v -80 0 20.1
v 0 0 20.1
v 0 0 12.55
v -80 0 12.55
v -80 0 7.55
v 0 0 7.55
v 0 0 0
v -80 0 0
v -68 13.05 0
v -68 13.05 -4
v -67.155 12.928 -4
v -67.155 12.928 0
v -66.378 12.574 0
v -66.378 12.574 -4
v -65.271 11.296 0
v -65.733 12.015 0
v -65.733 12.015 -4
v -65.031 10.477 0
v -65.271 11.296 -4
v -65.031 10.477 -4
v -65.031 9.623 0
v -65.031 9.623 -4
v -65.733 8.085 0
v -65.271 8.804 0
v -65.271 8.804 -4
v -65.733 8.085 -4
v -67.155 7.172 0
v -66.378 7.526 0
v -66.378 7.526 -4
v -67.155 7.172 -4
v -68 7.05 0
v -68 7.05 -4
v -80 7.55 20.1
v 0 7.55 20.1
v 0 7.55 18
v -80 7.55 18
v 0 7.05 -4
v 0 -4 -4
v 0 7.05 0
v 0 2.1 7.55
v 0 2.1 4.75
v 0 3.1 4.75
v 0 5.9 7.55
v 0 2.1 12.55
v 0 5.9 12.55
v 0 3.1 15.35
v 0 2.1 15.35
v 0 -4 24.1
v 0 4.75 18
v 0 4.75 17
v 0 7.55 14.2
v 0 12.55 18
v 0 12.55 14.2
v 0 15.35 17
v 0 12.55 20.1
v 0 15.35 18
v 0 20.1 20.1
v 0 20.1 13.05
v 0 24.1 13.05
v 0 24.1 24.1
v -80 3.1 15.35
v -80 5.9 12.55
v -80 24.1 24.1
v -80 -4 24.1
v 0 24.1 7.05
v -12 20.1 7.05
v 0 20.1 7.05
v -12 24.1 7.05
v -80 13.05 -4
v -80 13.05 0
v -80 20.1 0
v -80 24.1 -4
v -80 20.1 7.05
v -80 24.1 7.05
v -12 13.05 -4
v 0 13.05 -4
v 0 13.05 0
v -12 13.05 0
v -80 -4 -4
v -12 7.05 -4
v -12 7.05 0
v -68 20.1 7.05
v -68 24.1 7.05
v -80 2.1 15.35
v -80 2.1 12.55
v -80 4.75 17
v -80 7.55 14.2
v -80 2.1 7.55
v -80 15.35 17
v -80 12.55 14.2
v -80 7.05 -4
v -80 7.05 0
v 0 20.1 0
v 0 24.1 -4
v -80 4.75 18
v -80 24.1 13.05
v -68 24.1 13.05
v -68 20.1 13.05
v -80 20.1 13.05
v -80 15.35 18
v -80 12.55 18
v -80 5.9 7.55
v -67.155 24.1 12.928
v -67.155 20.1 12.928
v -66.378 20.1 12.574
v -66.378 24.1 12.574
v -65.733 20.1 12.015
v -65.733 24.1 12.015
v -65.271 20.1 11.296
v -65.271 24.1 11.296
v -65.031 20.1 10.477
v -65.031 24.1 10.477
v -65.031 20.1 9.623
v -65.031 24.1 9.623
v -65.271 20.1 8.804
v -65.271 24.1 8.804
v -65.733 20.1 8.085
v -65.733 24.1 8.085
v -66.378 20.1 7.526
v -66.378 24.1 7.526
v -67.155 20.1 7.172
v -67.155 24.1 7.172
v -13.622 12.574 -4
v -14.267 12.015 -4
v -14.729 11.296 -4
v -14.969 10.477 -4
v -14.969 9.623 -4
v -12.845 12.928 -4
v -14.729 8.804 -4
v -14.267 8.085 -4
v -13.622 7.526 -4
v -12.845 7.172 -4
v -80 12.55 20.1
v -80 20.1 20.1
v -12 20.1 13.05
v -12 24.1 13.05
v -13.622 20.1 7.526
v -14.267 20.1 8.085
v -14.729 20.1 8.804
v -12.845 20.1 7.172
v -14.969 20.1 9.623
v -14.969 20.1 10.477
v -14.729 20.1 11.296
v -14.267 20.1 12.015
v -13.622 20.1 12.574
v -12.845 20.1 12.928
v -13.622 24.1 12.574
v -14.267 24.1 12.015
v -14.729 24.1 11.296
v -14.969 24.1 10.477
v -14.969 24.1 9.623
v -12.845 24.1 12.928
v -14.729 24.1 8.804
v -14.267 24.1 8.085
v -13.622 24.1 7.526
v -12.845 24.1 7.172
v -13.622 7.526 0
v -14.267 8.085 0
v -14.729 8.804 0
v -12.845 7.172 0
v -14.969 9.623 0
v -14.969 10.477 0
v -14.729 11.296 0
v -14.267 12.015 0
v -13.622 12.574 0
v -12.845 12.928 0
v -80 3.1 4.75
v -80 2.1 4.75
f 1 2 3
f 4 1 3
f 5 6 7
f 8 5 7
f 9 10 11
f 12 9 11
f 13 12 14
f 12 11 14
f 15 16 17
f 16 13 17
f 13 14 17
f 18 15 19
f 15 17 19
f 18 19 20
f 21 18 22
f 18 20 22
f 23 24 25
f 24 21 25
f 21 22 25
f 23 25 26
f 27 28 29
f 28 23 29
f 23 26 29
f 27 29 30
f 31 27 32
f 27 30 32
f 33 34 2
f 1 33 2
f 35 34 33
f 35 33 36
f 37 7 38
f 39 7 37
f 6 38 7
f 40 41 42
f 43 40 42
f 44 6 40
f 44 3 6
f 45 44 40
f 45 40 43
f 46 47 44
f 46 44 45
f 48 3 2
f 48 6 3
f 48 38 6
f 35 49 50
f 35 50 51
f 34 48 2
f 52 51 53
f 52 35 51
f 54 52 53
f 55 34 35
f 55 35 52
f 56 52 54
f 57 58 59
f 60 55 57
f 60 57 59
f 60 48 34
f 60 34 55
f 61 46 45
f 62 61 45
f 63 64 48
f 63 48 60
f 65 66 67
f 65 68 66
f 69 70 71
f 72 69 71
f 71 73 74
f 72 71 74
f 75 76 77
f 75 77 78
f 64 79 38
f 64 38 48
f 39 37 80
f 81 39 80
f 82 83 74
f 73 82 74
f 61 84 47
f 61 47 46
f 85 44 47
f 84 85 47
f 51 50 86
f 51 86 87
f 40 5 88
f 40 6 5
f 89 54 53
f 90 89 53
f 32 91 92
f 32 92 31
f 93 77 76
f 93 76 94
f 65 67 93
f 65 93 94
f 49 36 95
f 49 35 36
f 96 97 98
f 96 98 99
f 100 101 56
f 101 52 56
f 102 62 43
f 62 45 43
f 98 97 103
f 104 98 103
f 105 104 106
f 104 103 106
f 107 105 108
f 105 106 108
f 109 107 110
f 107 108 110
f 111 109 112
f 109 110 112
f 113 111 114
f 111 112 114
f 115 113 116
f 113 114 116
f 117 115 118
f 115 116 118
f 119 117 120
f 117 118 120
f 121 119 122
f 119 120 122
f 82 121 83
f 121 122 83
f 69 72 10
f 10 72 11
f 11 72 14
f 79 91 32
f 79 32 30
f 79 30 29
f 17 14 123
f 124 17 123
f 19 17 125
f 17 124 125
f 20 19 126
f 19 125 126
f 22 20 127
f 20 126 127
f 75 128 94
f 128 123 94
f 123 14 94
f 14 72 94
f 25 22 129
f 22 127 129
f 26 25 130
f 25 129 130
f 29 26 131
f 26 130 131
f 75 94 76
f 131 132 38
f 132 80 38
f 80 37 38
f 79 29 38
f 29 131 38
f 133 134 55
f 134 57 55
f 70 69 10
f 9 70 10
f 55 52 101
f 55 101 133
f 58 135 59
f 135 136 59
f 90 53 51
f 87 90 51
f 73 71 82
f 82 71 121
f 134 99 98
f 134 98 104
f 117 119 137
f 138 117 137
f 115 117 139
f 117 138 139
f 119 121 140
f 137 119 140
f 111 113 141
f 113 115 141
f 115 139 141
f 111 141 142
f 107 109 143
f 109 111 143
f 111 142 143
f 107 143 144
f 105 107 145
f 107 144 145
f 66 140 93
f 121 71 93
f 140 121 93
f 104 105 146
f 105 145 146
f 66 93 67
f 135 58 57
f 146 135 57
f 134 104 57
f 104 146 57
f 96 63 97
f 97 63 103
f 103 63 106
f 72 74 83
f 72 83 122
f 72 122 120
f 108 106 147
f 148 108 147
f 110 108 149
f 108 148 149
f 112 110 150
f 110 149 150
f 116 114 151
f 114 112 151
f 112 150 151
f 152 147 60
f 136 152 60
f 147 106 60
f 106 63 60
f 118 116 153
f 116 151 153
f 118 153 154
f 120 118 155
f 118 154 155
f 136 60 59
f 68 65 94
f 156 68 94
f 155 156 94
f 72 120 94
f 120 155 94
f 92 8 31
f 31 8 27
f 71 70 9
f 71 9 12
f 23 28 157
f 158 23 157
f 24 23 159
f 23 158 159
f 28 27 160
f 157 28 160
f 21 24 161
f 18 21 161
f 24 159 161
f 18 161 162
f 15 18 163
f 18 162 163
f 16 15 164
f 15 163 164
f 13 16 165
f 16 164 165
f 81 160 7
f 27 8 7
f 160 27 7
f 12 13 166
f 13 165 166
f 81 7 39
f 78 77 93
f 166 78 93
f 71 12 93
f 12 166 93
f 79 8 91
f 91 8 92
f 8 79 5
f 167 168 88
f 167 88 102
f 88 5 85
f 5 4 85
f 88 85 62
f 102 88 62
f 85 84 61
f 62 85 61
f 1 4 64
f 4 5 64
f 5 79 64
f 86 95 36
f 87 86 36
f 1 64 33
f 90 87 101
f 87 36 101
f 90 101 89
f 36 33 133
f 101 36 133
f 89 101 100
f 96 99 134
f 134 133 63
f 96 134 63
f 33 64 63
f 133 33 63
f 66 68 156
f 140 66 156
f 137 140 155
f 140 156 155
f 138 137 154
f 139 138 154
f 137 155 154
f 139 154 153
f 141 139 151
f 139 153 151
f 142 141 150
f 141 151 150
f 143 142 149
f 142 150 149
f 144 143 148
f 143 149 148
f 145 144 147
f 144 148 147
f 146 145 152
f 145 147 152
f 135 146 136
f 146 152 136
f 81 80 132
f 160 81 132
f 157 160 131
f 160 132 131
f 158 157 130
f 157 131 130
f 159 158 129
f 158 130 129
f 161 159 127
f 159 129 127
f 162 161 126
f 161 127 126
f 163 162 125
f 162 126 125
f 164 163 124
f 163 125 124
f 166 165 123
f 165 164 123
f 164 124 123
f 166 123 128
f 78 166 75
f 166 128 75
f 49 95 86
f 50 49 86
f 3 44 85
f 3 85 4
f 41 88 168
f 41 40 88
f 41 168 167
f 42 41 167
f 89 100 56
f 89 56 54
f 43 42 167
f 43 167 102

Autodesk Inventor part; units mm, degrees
ref_plane "YZ Plane" through (0, 0, 0) normal (1, 0, 0) x (0, 1, 0)
ref_plane "XZ Plane" through (0, 0, 0) normal (0, 1, 0) x (-1, 0, 0)
ref_plane "XY Plane" through (0, 0, 0) normal (0, 0, 1) x (1, 0, 0)
sketch "Sketch1" plane through (0, 0, 0) normal (1, 0, 0) x (0, 1, 0)
  line L0 (0, 0) -> (20.1, 0)
  line L1 (20.1, 0) -> (20.1, 20.1)
  line L2 (20.1, 20.1) -> (0, 20.1)
  line L3 (0, 20.1) -> (0, 0)
  line L4 (-4, 24.1) -> (24.1, 24.1)
  line L5 (24.1, 24.1) -> (24.1, -4)
  line L6 (24.1, -4) -> (-4, -4)
  line L7 (-4, -4) -> (-4, 24.1)
  line L8 (12.55, 22.2) -> (7.55, 22.2)
  line L9 (7.55, 22.2) -> (7.55, 18)
  line L10 (7.55, 18) -> (12.55, 18)
  line L11 (12.55, 18) -> (12.55, 22.2)
  line L12 (12.55, 22.2) -> (7.55, 18) construction
  line L13 (7.55, 22.2) -> (12.55, 18) construction
  line L14 (12.55, 18) -> (15.35, 18)
  line L15 (15.35, 18) -> (15.35, 17)
  line L16 (15.35, 17) -> (12.55, 14.2)
  line L17 (12.55, 14.2) -> (7.55, 14.2)
  line L18 (7.55, 18) -> (4.75, 18)
  line L19 (4.75, 18) -> (4.75, 17)
  line L20 (4.75, 17) -> (7.55, 14.2)
  line L21 (2.1, 15.35) -> (3.1, 15.35)
  line L22 (3.1, 4.75) -> (5.9, 7.55)
  line L23 (2.1, 4.75) -> (3.1, 4.75)
  line L24 (-2.1, 12.55) -> (-2.1, 7.55)
  line L25 (2.1, 12.55) -> (-2.1, 12.55)
  line L26 (-2.1, 12.55) -> (2.1, 7.55) construction
  line L27 (-2.1, 7.55) -> (2.1, 12.55) construction
  line L28 (2.1, 7.55) -> (2.1, 4.75)
  line L29 (-2.1, 7.55) -> (2.1, 7.55)
  line L30 (2.1, 7.55) -> (2.1, 12.55)
  line L31 (5.9, 12.55) -> (5.9, 7.55)
  line L32 (2.1, 12.55) -> (2.1, 15.35)
  line L33 (3.1, 15.35) -> (5.9, 12.55)
  point P0 (10.05, 20.1)
  point P1 (0, 10.05)
  point P2 (10.05, 20.1)
  point P3 (0, 10.05)
  point P4 (0, 7.55)
  point P5 (0, 12.55)
  point P6 (7.55, 20.1)
  point P7 (12.55, 20.1)
  dimension "d0" = 20.1
  dimension "d1" = 20.1
  dimension "d2" = 4
  dimension "d3" = 5
  dimension "d4" = 4.2
  dimension "d5" = 2.8
  dimension "d6" = 1
  dimension "d7" = 3.8
  dimension "d8" = 2.8
  dimension "d9" = 5
  dimension "d10" = 1
  dimension "d11" = 135
  dimension "d12" = 5
  dimension "d13" = 4.2
  dimension "d14" = 2.8
  dimension "d15" = 1
  dimension "d16" = 3.8
  dimension "d17" = 2.8
  dimension "d18" = 5
  dimension "d19" = 1
  dimension "d20" = 135
  dimension "d21" = 7.55
  dimension "d22" = 2.1
  dimension "d23" = 90
  dimension "d24" = 7.55
  dimension "d25" = 2.1
  dimension "d26" = 90
extrude "Extrusion1" add sketch "Sketch1" against normal blind 80 contours L29 L24 L25 L3 | L3 L25 L30 L29 | L30 L32 L21 L33 L31 L22 L23 L28 | L11 L10 L9 L2 | L2 L9 L8 L11 | L14 L15 L16 L17 L20 L19 L18 L10 | L4 L5 L6 L7
sketch "Sketch2" plane through (0, -4, -4) normal (0, -1, 0) x (1, 0, 0)
  line L0 (0, 28.1) -> (0, 0) projected
  line L1 (0, 28.1) -> (-80, 28.1) projected
  line L2 (-80, 0) -> (-80, 28.1) projected
  line L3 (0, 0) -> (-80, 0) projected
  line L4 (-80, 0) -> (0, 28.1) construction
  line L5 (-80, 28.1) -> (0, 0) construction
  line L6 (-60.4, 34.15) -> (-60.4, -6.05) construction
  line L7 (-60.4, -6.05) -> (-19.6, -6.05) construction
  line L8 (-19.6, -6.05) -> (-19.6, 34.15) construction
  line L9 (-19.6, 34.15) -> (-60.4, 34.15) construction
  line L10 (-60.4, 34.15) -> (-19.6, -6.05) construction
  line L11 (-60.4, -6.05) -> (-19.6, 34.15) construction
  circle A0 centre (-19.6, 34.15) radius 1.6
  circle A1 centre (-19.6, -8.25) radius 1.6
  circle A2 centre (-57.6, 34.15) radius 1.6
  circle A3 centre (-57.6, -8.25) radius 1.6
  line L12 (-23, 28.1) -> (-57, 28.1)
  line L13 (-23, 0) -> (-57, 0)
  line L14 (0, 28.1) -> (-80, 28.1) projected
  point P0 (0, 4)
  point P1 (-40, 14.05)
  dimension "d32" = 3.2
  dimension "d35" = 42.4
  dimension "d38" = 38
  dimension "d66" = 40.8
  dimension "d67" = 40.2
extrude "Extrusion2" [suppressed]
sketch "Sketch3" plane through (0, 24.1, 24.1) normal (0, 1, 0) x (1, 0, 0)
  line L0 (0, 28.1) -> (0, 0) projected
  line L1 (0, 28.1) -> (-80, 28.1) projected
  line L2 (-80, 0) -> (-80, 28.1) projected
  line L3 (0, 0) -> (-80, 0) projected
  line L4 (0, 16.55) -> (0, 11.55) construction
  line L5 (0, 14.05) -> (-80, 14.05) construction
  line L6 (-80, 28.1) -> (-80, 0) construction
  circle A0 centre (-12, 14.05) radius 3
  circle A1 centre (-68, 14.05) radius 3
  line L7 (-68, 17.05) -> (-80, 17.05)
  line L8 (-68, 11.05) -> (-80, 11.05)
  line L9 (-12, 17.05) -> (0, 17.05)
  line L10 (0, 19.35) -> (0, 16.55) projected
  line L11 (-12, 11.05) -> (0, 11.05)
  line L12 (0, 8.75) -> (0, 11.55) projected
  point P0 (0, 24.1)
  point P1 (0, 11.05)
  point P2 (-80, 11.05)
  dimension "d49" = 6
  dimension "d50" = 6
  dimension "d51" = 12
  dimension "d52" = 12
  dimension "d53" = 6
  dimension "d54" = 6
extrude "Extrusion3" cut sketch "Sketch3" against normal up to surface (4 mm away) contours L0 L11 A0 L9 | L7 A1 L8 L2 | A0 | A1
ref_plane "Work Plane1" through (0, 24.1, -4) normal (0, -0.7071, -0.7071) x (-1, 0, 0)
mirror "Mirror1" about plane through (0, 24.1, -4) normal (0, -0.7071, -0.7071) of "Extrusion3"
extrude "Extrusão4" [suppressed]
fillet "Arredondamento3" [suppressed]
equation "\"d8\" = d5"
equation "\"d9\" = d3"
equation "\"d10\" = d6"
equation "\"d17\" = d14"
equation "\"d18\" = d12"
equation "\"d19\" = d15"
properties part number "cameraSlider3"
